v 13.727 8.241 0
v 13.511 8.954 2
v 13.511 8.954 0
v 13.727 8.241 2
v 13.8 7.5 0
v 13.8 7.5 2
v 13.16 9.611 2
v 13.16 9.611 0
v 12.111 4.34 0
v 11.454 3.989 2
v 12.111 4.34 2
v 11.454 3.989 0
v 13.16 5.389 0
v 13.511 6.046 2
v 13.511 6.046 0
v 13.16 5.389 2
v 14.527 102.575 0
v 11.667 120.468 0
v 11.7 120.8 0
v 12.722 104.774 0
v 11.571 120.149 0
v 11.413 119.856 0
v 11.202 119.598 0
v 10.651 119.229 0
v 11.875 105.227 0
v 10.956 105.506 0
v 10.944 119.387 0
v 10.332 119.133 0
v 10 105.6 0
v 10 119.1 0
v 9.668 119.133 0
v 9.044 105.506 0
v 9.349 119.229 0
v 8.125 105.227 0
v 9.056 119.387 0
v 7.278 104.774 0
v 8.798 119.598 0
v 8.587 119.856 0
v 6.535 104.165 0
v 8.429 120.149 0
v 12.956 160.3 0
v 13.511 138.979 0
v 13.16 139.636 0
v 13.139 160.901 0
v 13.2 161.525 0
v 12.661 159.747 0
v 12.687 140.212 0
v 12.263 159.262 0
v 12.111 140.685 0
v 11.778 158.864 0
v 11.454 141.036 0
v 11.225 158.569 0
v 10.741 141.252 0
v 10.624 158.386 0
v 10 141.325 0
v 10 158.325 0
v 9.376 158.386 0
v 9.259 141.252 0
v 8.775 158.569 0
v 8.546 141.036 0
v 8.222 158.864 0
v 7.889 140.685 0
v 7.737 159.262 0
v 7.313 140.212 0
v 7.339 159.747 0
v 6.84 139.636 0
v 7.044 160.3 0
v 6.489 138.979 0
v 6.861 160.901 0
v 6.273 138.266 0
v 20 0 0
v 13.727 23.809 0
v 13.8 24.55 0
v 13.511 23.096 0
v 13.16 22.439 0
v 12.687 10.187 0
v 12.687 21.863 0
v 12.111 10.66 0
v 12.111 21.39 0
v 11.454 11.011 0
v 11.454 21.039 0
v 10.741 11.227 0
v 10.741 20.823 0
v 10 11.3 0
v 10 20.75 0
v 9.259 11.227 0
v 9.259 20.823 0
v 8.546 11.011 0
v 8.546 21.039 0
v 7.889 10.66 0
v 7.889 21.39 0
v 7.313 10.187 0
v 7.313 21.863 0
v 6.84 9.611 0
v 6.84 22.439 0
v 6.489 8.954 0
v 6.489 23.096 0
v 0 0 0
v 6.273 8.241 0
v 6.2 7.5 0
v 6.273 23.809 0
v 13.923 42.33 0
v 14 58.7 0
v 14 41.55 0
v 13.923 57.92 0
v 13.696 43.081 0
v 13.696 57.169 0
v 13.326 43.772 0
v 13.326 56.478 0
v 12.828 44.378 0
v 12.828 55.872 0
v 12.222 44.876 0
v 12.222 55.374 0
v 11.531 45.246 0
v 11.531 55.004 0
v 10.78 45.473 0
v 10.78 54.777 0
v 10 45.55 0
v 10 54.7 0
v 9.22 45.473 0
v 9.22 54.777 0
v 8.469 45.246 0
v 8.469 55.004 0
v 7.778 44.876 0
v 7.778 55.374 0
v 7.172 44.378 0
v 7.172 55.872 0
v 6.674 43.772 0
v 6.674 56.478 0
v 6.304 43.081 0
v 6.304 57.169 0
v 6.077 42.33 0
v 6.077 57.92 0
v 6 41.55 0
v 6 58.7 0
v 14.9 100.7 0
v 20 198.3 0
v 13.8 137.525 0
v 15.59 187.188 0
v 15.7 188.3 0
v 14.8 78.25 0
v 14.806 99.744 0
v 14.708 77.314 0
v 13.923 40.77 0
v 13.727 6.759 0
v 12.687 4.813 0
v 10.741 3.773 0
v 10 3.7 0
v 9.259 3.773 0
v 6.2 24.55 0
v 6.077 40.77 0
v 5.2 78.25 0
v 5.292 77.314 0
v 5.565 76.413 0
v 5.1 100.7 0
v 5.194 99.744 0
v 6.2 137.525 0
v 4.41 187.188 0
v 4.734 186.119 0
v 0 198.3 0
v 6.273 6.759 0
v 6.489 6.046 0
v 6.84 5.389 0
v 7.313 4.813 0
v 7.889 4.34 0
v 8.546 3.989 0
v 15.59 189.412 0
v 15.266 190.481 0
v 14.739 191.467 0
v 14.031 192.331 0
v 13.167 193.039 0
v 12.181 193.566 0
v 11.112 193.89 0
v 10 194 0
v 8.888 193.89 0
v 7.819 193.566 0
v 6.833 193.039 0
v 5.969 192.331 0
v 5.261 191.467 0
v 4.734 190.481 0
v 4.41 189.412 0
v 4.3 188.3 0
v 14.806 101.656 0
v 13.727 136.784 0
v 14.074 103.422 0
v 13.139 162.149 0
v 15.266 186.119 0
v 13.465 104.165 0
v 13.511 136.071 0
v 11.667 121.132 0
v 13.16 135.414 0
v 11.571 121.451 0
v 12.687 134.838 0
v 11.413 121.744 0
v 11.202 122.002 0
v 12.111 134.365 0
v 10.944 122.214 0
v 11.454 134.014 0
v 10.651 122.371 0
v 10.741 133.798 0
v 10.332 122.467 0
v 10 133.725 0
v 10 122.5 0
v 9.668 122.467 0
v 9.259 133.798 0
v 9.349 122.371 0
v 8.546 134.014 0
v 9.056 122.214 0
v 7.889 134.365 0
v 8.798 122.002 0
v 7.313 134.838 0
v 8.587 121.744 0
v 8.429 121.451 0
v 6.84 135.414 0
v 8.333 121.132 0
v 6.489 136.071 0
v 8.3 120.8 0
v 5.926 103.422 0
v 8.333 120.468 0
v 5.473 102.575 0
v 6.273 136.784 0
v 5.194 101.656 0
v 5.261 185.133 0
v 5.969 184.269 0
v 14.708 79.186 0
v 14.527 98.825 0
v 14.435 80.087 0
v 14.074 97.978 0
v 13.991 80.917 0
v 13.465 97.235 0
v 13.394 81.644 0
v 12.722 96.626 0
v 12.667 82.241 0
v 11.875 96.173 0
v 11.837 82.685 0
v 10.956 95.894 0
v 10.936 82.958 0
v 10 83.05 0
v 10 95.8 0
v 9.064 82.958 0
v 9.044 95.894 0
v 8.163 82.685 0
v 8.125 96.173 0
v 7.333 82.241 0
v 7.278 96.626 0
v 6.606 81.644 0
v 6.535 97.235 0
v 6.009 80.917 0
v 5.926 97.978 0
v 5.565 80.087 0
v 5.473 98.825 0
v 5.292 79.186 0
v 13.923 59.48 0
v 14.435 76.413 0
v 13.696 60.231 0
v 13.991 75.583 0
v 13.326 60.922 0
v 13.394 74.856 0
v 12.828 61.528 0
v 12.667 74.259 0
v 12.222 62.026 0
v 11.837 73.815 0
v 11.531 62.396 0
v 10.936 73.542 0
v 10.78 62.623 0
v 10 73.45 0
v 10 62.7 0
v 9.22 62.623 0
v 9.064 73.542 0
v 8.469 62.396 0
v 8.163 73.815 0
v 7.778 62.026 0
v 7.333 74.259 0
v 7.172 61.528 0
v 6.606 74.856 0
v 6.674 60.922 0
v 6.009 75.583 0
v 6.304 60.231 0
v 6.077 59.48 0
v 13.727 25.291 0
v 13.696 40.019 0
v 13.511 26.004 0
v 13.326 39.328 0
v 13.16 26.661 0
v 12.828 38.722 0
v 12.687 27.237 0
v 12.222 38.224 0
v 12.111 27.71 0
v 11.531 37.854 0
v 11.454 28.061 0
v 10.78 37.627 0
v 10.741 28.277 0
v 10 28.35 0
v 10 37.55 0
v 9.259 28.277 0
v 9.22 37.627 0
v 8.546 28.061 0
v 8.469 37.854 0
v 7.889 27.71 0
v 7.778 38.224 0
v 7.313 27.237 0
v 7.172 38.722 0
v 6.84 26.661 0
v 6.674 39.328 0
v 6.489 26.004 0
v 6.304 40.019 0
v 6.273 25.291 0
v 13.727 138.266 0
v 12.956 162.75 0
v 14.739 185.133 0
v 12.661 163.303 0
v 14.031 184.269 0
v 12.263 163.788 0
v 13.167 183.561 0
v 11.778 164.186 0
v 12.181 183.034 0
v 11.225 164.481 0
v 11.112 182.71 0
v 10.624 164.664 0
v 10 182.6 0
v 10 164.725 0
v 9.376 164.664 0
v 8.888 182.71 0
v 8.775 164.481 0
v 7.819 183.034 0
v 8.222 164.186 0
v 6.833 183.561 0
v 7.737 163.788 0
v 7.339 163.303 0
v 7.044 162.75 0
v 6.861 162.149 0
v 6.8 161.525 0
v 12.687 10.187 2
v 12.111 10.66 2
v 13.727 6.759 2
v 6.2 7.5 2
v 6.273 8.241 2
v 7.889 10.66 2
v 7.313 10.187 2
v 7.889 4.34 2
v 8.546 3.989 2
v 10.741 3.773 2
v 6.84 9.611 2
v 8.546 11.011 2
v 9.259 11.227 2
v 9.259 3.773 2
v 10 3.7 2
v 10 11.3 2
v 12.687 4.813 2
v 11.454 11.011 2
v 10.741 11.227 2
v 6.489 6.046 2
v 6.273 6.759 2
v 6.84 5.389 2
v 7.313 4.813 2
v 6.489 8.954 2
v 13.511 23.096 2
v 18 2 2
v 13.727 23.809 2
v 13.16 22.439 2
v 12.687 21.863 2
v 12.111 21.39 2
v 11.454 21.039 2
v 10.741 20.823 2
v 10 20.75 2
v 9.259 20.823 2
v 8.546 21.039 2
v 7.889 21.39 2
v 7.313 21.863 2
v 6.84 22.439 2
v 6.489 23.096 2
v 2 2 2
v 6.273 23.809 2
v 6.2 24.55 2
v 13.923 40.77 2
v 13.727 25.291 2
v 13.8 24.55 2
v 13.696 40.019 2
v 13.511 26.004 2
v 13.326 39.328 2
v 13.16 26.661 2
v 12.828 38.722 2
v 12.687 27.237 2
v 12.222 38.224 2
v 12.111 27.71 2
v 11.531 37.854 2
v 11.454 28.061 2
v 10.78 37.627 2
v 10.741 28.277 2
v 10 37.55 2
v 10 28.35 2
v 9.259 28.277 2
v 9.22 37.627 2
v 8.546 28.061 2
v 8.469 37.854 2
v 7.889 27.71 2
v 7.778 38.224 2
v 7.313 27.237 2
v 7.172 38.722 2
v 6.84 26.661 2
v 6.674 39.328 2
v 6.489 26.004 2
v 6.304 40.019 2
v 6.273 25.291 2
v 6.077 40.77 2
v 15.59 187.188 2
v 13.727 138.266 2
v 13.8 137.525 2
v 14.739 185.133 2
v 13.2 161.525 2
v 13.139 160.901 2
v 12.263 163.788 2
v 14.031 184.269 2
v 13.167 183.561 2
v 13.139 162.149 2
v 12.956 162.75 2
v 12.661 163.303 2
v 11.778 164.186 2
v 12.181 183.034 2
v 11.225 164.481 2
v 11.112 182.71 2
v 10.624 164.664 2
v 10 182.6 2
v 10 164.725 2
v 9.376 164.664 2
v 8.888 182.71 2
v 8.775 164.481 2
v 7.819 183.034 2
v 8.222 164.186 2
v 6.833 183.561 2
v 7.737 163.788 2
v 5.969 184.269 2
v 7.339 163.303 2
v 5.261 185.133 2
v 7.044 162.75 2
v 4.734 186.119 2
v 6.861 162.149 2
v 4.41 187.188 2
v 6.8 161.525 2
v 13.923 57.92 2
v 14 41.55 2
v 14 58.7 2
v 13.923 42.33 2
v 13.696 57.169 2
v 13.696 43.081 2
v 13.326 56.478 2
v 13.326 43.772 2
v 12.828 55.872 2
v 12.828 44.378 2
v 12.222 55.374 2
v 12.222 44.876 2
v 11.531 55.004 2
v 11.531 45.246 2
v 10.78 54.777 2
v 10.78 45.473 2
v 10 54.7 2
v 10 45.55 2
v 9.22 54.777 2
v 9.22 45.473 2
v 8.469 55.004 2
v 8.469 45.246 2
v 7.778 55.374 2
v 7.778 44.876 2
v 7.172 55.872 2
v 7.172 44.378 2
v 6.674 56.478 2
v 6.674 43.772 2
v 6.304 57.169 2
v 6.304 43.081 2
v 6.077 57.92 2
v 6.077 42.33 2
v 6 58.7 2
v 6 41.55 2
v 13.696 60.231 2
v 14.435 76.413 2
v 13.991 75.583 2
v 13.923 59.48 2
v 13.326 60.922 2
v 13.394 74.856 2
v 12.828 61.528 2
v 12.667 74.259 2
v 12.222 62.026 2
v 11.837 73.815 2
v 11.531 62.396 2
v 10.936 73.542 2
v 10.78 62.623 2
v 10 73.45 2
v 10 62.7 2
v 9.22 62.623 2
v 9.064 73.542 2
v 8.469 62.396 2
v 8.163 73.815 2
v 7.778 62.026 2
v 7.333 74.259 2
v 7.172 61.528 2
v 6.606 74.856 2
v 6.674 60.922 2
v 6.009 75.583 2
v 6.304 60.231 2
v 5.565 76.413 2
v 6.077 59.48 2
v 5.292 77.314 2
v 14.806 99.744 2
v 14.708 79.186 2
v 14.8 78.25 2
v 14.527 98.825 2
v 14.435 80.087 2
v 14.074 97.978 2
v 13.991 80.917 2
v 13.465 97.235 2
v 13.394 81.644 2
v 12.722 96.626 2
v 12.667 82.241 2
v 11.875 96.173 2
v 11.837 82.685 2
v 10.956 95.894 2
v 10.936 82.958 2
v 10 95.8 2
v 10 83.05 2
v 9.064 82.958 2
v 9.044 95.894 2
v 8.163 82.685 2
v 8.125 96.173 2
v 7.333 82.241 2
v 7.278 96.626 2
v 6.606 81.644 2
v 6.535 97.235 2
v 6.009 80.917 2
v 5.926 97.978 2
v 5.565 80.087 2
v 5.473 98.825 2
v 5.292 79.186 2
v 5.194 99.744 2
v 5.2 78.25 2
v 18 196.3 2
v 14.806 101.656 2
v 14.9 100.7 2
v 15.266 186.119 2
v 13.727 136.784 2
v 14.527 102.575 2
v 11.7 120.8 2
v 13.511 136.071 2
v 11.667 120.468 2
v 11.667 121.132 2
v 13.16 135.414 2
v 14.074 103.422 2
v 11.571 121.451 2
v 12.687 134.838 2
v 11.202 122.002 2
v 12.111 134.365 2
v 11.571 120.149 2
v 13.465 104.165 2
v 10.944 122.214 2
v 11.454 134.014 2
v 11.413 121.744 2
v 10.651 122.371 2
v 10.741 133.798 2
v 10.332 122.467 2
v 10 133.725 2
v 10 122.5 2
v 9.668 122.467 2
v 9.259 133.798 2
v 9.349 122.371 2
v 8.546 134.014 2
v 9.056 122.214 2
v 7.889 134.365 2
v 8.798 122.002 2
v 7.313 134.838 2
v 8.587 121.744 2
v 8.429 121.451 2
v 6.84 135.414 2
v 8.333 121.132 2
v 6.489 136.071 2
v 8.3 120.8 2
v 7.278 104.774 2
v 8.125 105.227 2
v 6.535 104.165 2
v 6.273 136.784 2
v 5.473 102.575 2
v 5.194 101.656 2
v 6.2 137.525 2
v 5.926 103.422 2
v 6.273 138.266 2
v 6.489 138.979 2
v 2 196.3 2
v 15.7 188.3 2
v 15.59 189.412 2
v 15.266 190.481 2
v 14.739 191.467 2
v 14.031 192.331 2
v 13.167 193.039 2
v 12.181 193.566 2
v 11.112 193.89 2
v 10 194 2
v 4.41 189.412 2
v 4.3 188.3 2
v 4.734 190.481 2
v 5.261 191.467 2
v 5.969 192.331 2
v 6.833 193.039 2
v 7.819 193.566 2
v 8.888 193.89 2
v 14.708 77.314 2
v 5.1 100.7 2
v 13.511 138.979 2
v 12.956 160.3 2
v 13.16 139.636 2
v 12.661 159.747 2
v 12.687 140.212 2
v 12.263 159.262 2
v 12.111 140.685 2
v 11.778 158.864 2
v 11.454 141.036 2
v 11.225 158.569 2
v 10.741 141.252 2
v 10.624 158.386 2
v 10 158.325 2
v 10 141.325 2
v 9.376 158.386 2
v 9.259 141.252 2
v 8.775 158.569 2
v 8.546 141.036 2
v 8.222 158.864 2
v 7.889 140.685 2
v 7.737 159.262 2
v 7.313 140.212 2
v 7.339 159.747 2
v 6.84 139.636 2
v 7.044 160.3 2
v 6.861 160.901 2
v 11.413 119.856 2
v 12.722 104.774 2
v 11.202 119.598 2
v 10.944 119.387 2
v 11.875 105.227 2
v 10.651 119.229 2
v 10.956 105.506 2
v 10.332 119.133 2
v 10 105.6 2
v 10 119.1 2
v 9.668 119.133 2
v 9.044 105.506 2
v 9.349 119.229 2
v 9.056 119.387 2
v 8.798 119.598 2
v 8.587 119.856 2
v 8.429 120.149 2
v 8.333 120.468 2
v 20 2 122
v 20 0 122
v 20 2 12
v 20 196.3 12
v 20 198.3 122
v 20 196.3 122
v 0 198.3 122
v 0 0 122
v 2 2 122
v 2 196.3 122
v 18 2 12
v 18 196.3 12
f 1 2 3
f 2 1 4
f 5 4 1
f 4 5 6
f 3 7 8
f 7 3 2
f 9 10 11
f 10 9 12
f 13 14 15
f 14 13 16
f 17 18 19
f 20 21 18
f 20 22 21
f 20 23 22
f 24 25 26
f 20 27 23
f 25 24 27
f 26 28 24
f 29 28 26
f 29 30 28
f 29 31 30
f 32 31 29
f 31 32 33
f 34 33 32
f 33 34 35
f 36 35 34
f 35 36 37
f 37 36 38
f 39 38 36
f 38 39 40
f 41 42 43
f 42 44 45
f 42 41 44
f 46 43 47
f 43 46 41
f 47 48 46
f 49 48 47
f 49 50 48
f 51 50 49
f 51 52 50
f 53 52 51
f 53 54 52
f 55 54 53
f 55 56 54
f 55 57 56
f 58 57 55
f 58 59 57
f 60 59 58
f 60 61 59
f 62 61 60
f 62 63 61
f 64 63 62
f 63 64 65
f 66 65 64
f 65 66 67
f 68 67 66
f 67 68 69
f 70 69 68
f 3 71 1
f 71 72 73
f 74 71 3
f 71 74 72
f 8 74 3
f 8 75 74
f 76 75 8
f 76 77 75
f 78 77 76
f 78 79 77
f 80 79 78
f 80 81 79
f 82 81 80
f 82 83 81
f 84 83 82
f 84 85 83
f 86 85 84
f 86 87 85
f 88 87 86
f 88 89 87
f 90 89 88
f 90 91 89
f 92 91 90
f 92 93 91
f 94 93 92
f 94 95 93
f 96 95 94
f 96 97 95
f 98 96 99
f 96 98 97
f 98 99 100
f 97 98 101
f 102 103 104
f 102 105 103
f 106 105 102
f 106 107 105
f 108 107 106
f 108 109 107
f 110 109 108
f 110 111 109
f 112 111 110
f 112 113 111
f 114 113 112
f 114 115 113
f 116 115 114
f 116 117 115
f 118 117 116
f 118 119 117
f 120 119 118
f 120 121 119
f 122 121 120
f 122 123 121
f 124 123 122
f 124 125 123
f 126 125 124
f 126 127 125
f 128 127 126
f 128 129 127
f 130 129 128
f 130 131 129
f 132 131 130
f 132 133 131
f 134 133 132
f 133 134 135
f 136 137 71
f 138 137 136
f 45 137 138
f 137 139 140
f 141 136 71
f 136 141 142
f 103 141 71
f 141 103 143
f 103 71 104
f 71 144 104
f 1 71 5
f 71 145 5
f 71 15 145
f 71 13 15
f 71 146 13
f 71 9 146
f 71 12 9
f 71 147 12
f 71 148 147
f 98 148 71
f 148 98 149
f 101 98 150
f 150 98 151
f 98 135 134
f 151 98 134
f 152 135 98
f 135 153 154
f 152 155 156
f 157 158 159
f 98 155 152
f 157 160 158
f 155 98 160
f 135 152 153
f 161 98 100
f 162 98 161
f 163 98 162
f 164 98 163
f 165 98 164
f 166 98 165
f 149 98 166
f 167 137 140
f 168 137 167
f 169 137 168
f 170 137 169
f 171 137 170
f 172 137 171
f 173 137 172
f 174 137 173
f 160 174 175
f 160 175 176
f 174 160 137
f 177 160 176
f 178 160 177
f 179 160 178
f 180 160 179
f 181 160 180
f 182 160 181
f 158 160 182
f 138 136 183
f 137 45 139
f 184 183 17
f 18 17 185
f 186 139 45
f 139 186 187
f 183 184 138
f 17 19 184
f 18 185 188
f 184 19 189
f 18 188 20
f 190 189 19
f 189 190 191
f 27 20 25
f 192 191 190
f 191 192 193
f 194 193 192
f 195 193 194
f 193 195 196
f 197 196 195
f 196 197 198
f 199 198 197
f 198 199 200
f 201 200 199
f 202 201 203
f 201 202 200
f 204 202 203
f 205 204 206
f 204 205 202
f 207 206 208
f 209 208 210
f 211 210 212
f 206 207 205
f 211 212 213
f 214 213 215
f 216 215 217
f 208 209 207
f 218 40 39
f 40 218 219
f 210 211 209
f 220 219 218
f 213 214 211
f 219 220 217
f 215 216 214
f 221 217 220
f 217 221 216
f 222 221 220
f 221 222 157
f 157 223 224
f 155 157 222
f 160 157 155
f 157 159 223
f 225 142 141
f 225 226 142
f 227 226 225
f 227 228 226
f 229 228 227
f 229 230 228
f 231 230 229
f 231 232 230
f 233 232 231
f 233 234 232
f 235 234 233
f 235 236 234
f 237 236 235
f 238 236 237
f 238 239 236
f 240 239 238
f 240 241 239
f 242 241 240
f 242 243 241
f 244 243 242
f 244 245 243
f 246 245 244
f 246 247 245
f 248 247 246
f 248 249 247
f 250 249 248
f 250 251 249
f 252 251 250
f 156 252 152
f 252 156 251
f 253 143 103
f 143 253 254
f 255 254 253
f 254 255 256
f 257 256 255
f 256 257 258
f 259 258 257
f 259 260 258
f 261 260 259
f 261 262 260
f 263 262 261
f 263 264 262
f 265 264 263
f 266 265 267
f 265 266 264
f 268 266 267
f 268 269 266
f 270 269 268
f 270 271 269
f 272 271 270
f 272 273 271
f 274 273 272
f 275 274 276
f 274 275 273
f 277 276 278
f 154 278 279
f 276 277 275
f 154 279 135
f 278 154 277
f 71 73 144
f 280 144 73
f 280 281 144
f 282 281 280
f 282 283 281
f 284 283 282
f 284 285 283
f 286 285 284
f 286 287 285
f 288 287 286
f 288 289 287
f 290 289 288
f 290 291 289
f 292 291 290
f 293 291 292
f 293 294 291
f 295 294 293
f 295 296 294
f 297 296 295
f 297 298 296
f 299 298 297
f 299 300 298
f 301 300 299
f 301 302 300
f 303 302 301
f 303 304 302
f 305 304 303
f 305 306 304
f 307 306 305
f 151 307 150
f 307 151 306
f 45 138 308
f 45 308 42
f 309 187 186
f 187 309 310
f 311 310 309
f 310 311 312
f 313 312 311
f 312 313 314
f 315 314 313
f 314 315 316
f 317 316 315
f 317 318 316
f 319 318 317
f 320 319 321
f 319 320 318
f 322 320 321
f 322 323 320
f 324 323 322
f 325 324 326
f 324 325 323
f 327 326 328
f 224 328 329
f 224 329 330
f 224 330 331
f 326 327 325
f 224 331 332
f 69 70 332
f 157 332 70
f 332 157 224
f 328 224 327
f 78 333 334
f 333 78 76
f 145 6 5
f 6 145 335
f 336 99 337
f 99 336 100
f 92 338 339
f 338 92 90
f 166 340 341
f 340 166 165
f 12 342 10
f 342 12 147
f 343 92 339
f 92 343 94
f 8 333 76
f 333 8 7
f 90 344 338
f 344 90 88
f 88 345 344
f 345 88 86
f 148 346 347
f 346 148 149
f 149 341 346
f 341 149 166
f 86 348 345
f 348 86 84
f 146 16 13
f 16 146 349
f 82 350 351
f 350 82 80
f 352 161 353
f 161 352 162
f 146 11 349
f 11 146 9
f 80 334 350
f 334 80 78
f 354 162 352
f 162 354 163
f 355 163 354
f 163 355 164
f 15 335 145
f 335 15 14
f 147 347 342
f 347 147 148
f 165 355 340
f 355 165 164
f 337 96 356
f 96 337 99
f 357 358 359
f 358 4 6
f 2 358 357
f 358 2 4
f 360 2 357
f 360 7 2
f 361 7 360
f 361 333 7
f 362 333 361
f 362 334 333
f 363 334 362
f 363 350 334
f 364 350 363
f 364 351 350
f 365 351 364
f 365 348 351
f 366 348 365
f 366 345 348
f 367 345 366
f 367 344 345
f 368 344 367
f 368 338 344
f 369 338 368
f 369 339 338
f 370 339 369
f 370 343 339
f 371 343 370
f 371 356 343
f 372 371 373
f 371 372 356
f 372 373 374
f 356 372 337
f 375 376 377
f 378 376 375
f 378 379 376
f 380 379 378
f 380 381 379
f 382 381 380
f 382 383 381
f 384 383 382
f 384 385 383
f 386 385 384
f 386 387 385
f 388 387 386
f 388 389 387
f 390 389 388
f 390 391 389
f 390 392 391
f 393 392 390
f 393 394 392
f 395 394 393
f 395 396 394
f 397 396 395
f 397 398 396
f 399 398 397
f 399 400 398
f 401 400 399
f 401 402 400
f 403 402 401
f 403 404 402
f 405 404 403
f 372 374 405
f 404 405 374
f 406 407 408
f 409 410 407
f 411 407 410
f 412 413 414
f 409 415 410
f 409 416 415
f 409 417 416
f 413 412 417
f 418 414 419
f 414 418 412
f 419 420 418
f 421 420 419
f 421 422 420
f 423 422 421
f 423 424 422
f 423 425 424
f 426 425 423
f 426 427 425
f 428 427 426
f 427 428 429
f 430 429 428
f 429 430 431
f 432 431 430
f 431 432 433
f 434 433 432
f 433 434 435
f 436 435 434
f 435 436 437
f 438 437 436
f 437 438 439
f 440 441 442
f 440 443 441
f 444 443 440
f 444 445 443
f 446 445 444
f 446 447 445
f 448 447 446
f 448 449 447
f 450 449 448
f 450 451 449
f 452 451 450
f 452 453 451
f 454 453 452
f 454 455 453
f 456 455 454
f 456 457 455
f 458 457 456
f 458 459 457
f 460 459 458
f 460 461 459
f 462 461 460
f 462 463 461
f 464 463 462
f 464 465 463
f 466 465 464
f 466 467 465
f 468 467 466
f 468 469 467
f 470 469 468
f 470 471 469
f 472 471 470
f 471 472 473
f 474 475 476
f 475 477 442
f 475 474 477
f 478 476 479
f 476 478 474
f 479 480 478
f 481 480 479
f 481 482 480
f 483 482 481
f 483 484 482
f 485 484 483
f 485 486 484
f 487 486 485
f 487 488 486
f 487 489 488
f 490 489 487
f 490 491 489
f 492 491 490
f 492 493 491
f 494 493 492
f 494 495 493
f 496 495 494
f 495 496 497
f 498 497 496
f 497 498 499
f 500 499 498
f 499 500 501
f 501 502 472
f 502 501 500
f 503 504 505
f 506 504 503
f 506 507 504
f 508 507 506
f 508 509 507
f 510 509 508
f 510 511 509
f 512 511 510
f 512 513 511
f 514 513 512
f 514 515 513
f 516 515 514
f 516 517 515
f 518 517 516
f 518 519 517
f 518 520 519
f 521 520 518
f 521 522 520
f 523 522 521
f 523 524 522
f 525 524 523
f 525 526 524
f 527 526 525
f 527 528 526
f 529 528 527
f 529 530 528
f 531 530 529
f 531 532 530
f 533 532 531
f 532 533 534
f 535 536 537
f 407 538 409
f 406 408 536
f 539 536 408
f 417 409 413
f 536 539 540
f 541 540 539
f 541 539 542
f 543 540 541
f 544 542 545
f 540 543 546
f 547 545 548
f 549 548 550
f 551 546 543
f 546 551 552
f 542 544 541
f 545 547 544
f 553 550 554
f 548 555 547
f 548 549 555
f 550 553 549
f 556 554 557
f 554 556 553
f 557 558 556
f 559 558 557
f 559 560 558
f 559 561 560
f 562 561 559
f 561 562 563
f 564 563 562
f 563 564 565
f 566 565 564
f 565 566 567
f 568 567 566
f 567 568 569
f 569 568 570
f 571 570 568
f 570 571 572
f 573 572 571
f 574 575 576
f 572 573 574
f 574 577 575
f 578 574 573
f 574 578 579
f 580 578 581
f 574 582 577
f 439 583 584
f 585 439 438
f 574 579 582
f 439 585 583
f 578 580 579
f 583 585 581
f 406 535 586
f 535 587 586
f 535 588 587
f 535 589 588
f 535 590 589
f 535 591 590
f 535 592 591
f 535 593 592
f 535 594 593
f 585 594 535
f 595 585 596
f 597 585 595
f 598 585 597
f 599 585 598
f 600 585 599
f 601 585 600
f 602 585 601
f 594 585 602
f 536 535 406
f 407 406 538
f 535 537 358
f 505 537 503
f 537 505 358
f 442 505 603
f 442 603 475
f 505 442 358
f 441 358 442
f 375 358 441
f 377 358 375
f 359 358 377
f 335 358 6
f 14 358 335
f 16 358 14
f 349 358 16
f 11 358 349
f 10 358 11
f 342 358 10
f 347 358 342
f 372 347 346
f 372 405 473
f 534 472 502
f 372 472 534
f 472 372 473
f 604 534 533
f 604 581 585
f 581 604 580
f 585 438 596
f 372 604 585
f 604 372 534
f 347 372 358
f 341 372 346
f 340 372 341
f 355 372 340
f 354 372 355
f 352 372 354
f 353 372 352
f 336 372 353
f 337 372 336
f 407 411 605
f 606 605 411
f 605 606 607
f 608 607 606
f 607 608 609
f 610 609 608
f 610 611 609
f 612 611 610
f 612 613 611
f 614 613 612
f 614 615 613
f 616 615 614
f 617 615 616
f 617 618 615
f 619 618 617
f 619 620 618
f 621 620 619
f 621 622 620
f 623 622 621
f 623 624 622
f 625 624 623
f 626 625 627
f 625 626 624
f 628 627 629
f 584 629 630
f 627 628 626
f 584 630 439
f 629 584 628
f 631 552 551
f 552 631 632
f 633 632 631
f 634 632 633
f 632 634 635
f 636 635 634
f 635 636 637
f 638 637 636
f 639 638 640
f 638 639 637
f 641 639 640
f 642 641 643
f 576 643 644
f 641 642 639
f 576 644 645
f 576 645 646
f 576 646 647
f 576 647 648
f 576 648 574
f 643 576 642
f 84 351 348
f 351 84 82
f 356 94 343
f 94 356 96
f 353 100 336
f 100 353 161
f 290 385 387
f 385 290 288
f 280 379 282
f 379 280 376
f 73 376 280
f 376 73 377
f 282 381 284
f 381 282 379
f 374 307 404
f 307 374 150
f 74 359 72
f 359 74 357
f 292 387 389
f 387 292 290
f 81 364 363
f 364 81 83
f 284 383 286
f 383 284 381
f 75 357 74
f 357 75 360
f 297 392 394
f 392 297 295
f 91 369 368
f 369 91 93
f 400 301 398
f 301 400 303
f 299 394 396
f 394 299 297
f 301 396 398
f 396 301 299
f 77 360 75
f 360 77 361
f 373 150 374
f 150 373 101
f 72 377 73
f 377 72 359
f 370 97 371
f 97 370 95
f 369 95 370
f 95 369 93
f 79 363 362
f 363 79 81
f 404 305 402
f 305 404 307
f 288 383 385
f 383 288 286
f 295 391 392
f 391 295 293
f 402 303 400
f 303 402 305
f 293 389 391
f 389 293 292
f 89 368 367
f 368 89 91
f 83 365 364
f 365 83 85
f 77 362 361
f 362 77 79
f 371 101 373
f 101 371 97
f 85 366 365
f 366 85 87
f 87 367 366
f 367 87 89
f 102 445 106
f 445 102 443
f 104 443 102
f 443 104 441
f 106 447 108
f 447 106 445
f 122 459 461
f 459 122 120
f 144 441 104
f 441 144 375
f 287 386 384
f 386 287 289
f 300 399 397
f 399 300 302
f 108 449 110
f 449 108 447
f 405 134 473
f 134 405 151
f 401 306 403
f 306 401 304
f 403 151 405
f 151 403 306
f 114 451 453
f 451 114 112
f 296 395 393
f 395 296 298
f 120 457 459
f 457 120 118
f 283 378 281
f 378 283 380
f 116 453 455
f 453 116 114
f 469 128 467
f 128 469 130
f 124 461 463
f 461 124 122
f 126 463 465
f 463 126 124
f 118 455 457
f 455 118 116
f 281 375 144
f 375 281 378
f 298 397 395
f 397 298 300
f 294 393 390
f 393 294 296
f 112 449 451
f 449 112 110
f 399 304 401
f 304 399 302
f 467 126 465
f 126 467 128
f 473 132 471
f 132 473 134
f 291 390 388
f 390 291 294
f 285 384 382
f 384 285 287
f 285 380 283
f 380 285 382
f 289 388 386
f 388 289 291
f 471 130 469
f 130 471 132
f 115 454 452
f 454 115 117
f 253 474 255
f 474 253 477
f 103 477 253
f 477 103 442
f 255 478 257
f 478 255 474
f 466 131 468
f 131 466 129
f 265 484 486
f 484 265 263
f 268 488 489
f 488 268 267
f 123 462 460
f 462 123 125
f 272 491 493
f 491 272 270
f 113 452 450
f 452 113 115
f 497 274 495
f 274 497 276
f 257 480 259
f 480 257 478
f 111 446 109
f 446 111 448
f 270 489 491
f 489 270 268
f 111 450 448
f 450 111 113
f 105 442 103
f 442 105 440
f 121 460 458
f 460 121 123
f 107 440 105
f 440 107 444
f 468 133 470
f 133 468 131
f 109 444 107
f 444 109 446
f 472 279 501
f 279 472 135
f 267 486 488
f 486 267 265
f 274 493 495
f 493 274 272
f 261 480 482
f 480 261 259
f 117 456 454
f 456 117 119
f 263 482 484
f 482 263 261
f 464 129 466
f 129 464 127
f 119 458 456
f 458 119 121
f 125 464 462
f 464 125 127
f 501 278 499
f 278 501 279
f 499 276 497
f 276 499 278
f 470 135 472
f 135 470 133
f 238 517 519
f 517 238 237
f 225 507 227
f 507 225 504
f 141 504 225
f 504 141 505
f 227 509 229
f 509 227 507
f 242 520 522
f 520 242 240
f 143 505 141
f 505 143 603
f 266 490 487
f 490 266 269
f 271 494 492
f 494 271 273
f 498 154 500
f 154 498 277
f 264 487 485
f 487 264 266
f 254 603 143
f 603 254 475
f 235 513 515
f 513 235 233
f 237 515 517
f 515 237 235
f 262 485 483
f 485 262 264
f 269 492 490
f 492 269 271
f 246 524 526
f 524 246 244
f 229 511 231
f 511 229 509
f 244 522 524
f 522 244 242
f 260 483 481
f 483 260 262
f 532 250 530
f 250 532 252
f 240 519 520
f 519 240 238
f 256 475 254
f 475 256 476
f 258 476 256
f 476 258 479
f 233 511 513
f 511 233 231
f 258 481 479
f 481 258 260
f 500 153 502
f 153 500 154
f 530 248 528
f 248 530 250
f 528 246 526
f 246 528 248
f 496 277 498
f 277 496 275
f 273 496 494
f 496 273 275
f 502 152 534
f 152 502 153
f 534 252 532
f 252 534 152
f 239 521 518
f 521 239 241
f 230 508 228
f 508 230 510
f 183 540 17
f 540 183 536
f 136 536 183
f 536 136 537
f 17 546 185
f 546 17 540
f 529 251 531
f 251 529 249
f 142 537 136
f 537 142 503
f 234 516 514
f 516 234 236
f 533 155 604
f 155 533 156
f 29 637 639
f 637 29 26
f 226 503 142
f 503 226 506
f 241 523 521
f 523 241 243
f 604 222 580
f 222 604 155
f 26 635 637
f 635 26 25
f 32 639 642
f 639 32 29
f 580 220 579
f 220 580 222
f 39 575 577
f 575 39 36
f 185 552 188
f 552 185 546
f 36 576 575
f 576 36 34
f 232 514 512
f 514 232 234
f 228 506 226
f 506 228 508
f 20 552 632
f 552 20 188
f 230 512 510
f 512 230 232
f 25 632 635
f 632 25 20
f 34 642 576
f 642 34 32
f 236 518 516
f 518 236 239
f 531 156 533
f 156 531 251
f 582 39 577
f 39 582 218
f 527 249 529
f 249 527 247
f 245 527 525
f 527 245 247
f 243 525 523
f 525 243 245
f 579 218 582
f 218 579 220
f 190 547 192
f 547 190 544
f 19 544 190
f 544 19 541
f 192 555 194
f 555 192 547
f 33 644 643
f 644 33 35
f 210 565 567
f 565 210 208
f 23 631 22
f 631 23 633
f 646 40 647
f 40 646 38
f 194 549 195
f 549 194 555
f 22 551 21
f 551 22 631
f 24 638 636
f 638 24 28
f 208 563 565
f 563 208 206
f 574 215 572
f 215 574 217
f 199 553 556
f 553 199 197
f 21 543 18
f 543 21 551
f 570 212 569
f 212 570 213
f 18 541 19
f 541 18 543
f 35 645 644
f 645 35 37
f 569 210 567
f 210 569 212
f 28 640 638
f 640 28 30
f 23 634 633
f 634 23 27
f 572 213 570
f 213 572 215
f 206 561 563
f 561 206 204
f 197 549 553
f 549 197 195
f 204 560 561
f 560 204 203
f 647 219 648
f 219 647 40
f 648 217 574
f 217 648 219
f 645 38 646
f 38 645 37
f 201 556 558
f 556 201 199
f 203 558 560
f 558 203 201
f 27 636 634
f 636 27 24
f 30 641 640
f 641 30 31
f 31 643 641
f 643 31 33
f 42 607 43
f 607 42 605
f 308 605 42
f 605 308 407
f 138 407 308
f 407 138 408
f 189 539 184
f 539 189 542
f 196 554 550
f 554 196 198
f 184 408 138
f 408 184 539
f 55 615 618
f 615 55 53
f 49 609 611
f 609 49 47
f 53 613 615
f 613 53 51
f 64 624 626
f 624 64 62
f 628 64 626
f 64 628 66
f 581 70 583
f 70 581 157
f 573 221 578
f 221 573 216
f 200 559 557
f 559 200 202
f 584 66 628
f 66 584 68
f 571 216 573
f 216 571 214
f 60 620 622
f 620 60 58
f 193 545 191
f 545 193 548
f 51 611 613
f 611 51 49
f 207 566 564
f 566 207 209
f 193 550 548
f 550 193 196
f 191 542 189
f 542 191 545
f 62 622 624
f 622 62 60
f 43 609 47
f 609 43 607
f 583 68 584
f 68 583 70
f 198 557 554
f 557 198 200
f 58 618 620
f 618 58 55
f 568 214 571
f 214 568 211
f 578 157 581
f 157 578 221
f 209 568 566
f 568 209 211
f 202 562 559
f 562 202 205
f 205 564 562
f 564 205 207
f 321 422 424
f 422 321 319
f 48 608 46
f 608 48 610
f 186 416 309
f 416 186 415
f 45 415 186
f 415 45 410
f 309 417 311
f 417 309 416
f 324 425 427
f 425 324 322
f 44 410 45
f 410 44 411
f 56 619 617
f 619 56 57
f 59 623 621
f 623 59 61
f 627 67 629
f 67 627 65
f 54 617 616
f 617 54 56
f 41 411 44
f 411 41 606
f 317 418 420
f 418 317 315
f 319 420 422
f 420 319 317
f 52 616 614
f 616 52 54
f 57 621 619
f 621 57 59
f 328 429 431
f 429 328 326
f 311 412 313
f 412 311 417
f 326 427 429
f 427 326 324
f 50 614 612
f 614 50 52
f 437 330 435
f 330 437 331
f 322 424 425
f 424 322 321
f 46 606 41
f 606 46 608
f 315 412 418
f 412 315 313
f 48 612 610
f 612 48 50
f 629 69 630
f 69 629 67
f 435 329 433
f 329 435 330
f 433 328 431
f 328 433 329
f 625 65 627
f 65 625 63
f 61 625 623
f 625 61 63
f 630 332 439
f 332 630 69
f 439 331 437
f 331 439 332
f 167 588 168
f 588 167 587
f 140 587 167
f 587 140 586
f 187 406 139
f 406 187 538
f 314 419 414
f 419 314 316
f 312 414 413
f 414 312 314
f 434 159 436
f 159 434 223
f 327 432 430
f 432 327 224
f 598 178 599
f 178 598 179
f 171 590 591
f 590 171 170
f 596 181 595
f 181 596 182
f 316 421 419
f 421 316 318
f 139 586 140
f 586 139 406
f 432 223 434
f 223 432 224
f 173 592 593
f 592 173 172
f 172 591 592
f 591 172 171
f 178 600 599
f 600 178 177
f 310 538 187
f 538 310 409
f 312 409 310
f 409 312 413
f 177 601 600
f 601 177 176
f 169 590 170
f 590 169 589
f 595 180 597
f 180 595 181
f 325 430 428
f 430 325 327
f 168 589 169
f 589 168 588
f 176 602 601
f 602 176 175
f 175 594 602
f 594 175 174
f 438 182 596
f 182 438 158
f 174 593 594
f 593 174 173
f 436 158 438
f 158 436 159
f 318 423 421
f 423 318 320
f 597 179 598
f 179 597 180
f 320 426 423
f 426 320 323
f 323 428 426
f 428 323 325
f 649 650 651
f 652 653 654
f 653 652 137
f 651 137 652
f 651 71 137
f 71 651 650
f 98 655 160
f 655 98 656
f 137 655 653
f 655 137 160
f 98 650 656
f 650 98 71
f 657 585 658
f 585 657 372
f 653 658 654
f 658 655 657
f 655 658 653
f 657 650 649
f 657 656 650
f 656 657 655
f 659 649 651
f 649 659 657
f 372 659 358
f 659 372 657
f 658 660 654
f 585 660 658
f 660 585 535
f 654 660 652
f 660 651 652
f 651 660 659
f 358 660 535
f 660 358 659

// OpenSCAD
$fn = 32;

tolerance = 0.2;

w = 20;
max_d = 203;
inner_h = 120;
thickness = 2;
tool_distance = 2;

// [hole, size]
tool_list = [
  [7.2, 15],
  [7.2, 15.1],
  [7.6, 14.9],
  [7.6, 15.4],
  [9.2, 19.7],
  [9.4, 21.2],
  
  [3, 15],
  [7.2, 14.45],
  [6, 29.55],
  [11, 20]
];

// returns [[hole, position], ...]
function _tool_data(start = 0, i = 0, acc = []) =
  i == len(tool_list)
  ? acc
  : _tool_data(
    start + tool_list[i][1] + tool_distance,
    i + 1,
    concat(
      acc,
      [[tool_list[i][0], [0, start + tool_list[i][1] / 2, 0]]]
    )
  );

function _holder_depth(tool_data) =
  let (last_i = len(tool_data) - 1,
      res = tool_data[last_i][1][1]
      + tool_list[last_i][1] / 2)
    assert(res <= max_d)
    res;

tool_data = _tool_data();
holder_d = _holder_depth(tool_data);

union() {
  cube([thickness, holder_d, inner_h + thickness]);
  cube([w, thickness, inner_h + thickness]);
  translate([0, holder_d - thickness, 0])
    cube([w, thickness, inner_h + thickness]);
  translate([w - thickness, 0, 0])
    cube([thickness, holder_d, 10 + thickness]);
  difference() {
    cube([w, holder_d, thickness]);
    for (tool = _tool_data()) {
      translate([w / 2, 0, 0])
        translate(tool[1])
          cylinder(d = tool[0] + tolerance * 2, h = thickness);
    }
  }
}
